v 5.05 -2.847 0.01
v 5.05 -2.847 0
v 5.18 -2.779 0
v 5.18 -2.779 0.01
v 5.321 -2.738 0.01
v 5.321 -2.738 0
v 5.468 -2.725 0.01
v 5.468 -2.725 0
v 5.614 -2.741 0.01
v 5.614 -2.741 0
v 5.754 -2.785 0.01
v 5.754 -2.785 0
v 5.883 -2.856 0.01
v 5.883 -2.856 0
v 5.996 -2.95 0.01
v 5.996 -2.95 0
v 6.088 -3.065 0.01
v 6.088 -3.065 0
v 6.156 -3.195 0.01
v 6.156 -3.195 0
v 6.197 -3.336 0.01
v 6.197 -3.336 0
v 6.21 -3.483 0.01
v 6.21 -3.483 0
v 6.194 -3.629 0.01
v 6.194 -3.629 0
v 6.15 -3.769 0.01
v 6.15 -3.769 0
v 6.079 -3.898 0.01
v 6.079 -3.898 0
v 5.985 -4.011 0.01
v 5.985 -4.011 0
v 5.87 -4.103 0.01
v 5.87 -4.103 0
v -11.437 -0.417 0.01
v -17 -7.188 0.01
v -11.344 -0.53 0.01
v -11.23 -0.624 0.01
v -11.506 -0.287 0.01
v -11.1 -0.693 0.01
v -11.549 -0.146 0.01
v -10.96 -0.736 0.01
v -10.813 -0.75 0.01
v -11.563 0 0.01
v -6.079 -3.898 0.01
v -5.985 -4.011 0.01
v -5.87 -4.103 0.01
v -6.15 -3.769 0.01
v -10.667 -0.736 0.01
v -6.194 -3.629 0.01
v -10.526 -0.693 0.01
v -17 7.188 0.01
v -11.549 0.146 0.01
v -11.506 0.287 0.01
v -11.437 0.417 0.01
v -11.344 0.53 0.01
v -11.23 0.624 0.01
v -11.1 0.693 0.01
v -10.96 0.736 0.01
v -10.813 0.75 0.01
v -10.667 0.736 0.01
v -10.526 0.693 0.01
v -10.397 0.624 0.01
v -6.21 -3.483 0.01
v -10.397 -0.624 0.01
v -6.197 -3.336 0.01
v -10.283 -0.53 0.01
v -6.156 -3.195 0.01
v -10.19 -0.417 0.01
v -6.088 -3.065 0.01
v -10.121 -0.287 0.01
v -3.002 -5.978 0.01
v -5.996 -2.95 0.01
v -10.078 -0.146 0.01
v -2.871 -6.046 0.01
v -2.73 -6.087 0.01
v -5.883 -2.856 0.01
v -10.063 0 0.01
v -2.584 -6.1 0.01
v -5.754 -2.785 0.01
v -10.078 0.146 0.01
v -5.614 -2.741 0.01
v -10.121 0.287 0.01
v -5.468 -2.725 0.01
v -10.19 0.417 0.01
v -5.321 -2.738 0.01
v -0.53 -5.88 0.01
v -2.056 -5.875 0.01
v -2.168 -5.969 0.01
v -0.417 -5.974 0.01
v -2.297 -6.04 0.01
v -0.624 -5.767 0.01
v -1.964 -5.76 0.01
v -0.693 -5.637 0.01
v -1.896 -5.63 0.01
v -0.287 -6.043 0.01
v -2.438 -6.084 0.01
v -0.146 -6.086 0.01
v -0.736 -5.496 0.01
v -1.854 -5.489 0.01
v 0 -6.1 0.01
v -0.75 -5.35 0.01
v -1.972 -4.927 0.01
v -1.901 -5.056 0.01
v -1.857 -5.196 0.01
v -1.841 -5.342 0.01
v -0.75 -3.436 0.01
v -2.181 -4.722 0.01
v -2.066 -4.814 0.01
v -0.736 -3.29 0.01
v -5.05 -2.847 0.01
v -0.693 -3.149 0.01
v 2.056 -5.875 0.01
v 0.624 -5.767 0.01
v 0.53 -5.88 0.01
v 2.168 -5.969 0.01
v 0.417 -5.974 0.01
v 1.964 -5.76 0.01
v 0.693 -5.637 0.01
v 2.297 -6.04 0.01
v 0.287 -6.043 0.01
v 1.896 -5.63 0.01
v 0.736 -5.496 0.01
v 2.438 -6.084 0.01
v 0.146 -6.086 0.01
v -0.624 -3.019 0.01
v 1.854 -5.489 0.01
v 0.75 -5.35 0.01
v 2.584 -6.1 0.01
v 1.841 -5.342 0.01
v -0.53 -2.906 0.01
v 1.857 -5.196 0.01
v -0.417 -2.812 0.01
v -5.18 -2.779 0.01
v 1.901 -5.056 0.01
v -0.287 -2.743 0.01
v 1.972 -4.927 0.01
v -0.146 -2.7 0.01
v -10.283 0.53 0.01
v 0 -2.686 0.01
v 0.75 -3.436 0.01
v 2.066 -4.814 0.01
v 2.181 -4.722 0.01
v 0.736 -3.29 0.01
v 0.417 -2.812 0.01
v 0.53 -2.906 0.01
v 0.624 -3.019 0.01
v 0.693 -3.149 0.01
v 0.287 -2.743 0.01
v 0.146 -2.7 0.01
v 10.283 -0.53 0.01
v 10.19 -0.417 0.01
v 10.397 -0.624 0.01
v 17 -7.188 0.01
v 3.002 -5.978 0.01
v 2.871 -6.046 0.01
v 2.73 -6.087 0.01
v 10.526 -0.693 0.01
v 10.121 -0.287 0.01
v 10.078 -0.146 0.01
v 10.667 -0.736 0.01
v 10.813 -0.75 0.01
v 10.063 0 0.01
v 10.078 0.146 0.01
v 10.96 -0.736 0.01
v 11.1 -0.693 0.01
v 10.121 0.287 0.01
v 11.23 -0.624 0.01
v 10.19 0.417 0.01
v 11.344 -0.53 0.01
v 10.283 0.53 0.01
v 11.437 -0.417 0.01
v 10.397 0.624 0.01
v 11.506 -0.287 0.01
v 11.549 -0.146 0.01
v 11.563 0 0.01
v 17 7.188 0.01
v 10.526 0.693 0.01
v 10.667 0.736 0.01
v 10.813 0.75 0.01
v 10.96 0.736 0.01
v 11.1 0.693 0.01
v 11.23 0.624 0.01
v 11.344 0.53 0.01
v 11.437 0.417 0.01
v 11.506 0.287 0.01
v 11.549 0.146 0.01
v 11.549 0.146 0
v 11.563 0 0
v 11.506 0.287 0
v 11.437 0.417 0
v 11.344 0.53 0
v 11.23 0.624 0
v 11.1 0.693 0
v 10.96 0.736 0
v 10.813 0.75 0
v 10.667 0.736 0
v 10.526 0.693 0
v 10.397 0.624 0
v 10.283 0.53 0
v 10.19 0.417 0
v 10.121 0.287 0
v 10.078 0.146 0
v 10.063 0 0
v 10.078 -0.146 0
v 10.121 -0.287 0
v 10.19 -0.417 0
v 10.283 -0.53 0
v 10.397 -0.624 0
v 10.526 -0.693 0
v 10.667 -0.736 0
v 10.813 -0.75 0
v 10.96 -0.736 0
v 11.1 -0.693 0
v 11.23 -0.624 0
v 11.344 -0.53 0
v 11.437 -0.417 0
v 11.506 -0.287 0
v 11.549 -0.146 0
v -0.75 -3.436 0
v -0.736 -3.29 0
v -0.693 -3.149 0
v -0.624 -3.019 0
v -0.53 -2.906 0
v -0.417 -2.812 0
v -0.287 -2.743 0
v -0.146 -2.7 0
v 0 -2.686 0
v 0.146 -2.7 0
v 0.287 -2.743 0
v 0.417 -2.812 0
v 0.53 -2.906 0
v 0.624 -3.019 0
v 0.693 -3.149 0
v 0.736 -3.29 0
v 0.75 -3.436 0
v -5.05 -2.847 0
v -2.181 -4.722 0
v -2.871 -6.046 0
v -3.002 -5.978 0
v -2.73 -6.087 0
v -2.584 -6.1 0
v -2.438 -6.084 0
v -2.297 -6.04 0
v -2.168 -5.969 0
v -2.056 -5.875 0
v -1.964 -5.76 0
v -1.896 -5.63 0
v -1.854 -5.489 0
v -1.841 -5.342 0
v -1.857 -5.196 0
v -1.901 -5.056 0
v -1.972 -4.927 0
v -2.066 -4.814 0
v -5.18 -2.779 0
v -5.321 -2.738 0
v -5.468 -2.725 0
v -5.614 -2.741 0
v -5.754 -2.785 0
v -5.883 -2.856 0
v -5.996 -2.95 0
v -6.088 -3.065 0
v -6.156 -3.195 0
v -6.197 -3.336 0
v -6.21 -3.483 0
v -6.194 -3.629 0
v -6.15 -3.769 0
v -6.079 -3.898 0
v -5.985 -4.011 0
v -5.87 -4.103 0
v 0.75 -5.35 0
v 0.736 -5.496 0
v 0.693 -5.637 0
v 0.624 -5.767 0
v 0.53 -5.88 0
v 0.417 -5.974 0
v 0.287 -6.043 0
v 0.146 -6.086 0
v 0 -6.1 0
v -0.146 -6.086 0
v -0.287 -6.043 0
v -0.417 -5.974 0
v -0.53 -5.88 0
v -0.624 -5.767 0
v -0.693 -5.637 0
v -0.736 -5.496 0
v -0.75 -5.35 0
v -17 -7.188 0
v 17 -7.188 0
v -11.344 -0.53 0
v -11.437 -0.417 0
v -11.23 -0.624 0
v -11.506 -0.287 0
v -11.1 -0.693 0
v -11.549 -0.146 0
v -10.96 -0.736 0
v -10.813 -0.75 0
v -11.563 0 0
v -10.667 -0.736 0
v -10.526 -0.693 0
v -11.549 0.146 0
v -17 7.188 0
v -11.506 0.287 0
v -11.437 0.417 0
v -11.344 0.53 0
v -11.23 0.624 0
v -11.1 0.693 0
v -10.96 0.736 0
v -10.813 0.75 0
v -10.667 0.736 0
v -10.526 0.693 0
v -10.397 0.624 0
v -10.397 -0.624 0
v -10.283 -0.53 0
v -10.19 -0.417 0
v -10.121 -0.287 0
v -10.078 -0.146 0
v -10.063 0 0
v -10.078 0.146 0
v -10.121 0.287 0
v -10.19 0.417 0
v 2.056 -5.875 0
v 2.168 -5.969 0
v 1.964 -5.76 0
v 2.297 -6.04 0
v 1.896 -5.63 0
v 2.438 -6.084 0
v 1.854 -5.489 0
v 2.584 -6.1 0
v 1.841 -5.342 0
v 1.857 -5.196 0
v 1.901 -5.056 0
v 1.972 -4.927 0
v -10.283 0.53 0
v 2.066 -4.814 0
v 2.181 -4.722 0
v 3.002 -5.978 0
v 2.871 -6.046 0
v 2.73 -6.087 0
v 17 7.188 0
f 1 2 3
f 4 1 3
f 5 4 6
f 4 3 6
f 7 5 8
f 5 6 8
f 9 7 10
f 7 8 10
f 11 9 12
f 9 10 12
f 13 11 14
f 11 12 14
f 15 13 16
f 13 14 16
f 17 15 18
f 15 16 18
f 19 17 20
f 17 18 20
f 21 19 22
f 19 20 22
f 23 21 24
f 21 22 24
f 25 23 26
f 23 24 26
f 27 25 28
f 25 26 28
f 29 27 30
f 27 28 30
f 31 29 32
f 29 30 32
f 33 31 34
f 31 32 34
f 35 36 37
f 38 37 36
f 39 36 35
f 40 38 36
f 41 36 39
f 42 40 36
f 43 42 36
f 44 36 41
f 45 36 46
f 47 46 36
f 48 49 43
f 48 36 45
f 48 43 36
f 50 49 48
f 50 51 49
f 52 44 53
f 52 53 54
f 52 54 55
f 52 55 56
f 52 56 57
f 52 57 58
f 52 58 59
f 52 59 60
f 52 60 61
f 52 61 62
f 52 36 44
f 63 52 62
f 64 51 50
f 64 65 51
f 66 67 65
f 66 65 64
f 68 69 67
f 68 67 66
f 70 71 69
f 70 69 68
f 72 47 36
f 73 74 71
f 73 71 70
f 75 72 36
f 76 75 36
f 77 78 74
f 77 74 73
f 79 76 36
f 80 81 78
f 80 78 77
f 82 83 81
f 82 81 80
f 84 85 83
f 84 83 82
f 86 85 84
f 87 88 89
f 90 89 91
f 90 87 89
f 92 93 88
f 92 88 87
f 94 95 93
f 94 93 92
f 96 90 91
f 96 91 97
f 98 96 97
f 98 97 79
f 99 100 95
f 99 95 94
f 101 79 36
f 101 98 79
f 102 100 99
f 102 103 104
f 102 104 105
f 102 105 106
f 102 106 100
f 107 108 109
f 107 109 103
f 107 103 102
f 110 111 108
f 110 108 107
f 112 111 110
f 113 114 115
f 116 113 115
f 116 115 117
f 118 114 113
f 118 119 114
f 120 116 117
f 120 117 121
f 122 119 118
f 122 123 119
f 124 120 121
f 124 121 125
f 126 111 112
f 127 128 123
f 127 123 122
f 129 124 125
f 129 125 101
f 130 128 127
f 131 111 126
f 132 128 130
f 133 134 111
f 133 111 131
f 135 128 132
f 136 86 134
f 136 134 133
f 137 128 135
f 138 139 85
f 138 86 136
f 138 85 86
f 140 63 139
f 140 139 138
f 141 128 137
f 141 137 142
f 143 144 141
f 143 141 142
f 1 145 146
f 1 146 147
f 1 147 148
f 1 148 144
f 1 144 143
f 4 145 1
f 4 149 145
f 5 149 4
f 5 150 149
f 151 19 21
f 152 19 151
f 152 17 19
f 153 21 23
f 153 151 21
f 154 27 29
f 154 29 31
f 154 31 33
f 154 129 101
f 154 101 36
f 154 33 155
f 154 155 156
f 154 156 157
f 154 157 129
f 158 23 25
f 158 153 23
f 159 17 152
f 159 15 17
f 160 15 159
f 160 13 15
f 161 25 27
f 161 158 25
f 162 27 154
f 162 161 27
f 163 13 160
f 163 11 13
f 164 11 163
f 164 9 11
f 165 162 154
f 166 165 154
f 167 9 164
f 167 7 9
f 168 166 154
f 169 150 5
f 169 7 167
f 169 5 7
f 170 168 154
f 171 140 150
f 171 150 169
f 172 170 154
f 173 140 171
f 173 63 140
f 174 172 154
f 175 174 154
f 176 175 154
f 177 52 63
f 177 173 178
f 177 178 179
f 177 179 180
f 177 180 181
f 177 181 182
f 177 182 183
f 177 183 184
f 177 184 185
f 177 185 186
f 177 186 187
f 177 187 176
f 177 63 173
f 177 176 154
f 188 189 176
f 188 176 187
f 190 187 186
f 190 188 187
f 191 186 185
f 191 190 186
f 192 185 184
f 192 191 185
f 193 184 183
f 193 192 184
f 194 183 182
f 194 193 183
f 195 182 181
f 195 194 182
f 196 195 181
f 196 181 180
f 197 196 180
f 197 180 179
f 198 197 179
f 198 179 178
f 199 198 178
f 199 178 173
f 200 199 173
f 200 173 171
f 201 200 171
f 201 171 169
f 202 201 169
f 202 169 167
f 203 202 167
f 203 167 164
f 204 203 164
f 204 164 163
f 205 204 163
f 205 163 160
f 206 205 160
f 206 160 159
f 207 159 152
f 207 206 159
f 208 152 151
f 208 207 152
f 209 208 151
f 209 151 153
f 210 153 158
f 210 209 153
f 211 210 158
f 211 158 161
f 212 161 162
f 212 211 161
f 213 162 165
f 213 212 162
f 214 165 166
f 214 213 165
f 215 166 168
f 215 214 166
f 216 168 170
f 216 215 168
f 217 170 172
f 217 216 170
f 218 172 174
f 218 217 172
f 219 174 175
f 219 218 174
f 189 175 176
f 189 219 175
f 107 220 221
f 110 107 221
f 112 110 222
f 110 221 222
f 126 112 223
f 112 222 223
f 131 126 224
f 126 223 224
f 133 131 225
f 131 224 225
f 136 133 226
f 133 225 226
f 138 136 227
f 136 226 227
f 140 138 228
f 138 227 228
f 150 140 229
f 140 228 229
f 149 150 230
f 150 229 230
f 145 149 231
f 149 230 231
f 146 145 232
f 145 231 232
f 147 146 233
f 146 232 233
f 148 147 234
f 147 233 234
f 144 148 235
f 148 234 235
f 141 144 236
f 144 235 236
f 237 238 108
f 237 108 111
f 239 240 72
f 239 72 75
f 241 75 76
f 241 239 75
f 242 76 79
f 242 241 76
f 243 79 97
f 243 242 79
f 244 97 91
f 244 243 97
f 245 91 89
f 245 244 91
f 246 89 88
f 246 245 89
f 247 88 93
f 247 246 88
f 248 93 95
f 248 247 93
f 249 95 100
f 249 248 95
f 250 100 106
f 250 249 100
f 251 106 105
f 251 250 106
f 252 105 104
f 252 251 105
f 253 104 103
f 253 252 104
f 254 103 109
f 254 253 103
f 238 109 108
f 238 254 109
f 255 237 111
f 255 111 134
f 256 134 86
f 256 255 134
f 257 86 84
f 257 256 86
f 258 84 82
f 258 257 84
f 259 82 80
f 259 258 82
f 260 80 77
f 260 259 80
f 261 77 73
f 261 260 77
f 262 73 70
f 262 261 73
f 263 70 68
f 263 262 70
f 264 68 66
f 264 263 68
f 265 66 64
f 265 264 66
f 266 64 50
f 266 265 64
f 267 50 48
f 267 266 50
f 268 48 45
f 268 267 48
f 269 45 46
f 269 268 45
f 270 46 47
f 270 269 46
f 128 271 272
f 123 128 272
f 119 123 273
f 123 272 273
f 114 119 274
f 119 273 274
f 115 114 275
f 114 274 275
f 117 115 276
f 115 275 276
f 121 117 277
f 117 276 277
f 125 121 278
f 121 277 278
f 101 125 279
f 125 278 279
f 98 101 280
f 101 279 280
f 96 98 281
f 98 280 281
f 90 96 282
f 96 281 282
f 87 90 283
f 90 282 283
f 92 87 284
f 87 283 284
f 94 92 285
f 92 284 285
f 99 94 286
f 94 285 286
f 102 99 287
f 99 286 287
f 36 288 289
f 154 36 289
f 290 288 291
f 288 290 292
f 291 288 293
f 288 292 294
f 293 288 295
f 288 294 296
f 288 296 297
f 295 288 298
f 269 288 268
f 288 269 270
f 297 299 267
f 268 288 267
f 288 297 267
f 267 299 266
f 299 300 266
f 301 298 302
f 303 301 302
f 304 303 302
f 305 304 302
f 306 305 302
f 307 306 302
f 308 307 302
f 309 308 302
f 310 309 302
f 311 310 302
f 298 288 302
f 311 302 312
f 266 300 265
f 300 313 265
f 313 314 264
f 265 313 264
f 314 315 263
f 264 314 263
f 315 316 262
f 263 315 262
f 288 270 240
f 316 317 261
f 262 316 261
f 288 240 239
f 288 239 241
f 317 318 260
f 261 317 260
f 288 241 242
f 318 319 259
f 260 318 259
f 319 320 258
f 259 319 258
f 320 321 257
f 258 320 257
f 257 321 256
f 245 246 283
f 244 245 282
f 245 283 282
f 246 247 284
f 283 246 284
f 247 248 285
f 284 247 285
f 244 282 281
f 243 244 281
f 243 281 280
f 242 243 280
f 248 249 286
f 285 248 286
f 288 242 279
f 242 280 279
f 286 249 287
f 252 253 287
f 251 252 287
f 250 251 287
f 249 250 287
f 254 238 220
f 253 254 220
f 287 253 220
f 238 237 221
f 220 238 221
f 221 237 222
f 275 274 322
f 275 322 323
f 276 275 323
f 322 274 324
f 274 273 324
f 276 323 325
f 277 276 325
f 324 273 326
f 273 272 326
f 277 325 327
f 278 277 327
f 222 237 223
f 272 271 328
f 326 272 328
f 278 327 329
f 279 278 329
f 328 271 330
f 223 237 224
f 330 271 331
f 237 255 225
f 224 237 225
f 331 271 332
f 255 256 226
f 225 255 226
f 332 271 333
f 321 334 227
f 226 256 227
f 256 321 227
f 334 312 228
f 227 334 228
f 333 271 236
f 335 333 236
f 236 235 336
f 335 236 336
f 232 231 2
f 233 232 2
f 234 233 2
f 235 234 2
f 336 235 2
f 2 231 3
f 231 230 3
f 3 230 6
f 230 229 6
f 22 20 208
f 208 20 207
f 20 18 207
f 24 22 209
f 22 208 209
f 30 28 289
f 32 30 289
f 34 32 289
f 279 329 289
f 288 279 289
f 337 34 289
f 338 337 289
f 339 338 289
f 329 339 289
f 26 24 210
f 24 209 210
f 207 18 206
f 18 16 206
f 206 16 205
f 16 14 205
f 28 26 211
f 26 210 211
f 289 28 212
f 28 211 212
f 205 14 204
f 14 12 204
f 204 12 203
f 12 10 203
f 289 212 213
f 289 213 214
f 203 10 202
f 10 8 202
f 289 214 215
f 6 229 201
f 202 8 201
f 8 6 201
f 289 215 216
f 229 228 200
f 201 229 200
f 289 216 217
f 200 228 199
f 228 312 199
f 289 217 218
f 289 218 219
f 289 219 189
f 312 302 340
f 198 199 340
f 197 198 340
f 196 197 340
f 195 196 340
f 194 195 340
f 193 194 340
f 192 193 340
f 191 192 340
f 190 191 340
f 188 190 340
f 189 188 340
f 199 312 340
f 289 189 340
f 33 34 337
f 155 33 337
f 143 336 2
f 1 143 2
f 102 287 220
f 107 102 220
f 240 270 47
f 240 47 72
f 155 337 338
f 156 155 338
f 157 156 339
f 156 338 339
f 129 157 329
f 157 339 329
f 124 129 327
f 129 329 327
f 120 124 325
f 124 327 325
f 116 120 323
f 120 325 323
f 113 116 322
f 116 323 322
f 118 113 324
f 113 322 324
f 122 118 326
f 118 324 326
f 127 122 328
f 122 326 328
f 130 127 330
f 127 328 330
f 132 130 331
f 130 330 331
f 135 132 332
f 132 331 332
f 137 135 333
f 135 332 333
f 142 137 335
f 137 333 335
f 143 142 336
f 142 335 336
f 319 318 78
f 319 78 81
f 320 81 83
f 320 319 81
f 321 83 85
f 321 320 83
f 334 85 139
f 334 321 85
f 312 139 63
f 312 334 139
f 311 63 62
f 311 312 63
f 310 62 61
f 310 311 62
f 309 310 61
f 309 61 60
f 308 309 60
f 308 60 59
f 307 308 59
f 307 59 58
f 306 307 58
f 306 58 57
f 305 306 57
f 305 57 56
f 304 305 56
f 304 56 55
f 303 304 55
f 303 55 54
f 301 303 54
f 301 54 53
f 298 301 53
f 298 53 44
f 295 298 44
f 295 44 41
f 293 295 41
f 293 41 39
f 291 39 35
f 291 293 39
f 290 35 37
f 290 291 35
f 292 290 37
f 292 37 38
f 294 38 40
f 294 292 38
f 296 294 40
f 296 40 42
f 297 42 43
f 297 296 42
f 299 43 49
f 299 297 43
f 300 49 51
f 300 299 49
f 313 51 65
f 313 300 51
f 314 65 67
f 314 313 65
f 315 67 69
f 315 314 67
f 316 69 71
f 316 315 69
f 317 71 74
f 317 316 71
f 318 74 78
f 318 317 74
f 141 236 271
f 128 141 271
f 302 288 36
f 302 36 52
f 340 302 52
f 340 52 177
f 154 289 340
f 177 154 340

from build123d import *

# Parameters (mm, degrees)
SKETCH1_W               = 34
SKETCH1_H               = 14.37622091
BOSS_EXTRUDE1_DEPTH     = 0.01
CUT_EXTRUDE1_DEPTH      = 19.457221674
CUT_EXTRUDE1_DEPTH_BACK = 19.457221674
SKETCH2_R               = 0.75


with BuildPart() as part:
    # Sketch1 → Boss-Extrude1 (new body)
    with BuildSketch(Plane.XY):
        Rectangle(SKETCH1_W, SKETCH1_H)
    extrude(amount=BOSS_EXTRUDE1_DEPTH)

    # Sketch2 → Cut-Extrude1 (cut, two sides: drawn at the far end of the back side and taken through both)
    with BuildSketch(Plane.XY.offset(0.01).offset(-CUT_EXTRUDE1_DEPTH_BACK)):
        with Locations((10.813459435, 0)):
            Circle(SKETCH2_R)
        with Locations((-10.813459435, 0)):
            Circle(SKETCH2_R)
        with BuildLine():
            Line((5.870318791, -4.1029045), (3.001645254, -5.9778045))
            ThreePointArc((3.001645254, -5.9778045), (1.963521963, -5.760318791), (2.181007672, -4.7221955))
            Line((2.181007672, -4.7221955), (5.049681209, -2.8472955))
            ThreePointArc((5.049681209, -2.8472955), (6.0878045, -3.064781209), (5.870318791, -4.1029045))
        make_face()
        with BuildLine():
            Line((-5.870318791, -4.1029045), (-3.001645254, -5.9778045))
            ThreePointArc((-3.001645254, -5.9778045), (-1.963521963, -5.760318791), (-2.181007672, -4.7221955))
            Line((-2.181007672, -4.7221955), (-5.049681209, -2.8472955))
            ThreePointArc((-5.049681209, -2.8472955), (-6.0878045, -3.064781209), (-5.870318791, -4.1029045))
        make_face()
        with BuildLine():
            Line((-0.75, -5.35), (-0.75, -3.43605))
            ThreePointArc((-0.75, -3.43605), (0, -2.68605), (0.75, -3.43605))
            Line((0.75, -3.43605), (0.75, -5.35))
            ThreePointArc((0.75, -5.35), (0, -6.1), (-0.75, -5.35))
        make_face()
    extrude(amount=CUT_EXTRUDE1_DEPTH + CUT_EXTRUDE1_DEPTH_BACK, mode=Mode.SUBTRACT)


solid = part.part
